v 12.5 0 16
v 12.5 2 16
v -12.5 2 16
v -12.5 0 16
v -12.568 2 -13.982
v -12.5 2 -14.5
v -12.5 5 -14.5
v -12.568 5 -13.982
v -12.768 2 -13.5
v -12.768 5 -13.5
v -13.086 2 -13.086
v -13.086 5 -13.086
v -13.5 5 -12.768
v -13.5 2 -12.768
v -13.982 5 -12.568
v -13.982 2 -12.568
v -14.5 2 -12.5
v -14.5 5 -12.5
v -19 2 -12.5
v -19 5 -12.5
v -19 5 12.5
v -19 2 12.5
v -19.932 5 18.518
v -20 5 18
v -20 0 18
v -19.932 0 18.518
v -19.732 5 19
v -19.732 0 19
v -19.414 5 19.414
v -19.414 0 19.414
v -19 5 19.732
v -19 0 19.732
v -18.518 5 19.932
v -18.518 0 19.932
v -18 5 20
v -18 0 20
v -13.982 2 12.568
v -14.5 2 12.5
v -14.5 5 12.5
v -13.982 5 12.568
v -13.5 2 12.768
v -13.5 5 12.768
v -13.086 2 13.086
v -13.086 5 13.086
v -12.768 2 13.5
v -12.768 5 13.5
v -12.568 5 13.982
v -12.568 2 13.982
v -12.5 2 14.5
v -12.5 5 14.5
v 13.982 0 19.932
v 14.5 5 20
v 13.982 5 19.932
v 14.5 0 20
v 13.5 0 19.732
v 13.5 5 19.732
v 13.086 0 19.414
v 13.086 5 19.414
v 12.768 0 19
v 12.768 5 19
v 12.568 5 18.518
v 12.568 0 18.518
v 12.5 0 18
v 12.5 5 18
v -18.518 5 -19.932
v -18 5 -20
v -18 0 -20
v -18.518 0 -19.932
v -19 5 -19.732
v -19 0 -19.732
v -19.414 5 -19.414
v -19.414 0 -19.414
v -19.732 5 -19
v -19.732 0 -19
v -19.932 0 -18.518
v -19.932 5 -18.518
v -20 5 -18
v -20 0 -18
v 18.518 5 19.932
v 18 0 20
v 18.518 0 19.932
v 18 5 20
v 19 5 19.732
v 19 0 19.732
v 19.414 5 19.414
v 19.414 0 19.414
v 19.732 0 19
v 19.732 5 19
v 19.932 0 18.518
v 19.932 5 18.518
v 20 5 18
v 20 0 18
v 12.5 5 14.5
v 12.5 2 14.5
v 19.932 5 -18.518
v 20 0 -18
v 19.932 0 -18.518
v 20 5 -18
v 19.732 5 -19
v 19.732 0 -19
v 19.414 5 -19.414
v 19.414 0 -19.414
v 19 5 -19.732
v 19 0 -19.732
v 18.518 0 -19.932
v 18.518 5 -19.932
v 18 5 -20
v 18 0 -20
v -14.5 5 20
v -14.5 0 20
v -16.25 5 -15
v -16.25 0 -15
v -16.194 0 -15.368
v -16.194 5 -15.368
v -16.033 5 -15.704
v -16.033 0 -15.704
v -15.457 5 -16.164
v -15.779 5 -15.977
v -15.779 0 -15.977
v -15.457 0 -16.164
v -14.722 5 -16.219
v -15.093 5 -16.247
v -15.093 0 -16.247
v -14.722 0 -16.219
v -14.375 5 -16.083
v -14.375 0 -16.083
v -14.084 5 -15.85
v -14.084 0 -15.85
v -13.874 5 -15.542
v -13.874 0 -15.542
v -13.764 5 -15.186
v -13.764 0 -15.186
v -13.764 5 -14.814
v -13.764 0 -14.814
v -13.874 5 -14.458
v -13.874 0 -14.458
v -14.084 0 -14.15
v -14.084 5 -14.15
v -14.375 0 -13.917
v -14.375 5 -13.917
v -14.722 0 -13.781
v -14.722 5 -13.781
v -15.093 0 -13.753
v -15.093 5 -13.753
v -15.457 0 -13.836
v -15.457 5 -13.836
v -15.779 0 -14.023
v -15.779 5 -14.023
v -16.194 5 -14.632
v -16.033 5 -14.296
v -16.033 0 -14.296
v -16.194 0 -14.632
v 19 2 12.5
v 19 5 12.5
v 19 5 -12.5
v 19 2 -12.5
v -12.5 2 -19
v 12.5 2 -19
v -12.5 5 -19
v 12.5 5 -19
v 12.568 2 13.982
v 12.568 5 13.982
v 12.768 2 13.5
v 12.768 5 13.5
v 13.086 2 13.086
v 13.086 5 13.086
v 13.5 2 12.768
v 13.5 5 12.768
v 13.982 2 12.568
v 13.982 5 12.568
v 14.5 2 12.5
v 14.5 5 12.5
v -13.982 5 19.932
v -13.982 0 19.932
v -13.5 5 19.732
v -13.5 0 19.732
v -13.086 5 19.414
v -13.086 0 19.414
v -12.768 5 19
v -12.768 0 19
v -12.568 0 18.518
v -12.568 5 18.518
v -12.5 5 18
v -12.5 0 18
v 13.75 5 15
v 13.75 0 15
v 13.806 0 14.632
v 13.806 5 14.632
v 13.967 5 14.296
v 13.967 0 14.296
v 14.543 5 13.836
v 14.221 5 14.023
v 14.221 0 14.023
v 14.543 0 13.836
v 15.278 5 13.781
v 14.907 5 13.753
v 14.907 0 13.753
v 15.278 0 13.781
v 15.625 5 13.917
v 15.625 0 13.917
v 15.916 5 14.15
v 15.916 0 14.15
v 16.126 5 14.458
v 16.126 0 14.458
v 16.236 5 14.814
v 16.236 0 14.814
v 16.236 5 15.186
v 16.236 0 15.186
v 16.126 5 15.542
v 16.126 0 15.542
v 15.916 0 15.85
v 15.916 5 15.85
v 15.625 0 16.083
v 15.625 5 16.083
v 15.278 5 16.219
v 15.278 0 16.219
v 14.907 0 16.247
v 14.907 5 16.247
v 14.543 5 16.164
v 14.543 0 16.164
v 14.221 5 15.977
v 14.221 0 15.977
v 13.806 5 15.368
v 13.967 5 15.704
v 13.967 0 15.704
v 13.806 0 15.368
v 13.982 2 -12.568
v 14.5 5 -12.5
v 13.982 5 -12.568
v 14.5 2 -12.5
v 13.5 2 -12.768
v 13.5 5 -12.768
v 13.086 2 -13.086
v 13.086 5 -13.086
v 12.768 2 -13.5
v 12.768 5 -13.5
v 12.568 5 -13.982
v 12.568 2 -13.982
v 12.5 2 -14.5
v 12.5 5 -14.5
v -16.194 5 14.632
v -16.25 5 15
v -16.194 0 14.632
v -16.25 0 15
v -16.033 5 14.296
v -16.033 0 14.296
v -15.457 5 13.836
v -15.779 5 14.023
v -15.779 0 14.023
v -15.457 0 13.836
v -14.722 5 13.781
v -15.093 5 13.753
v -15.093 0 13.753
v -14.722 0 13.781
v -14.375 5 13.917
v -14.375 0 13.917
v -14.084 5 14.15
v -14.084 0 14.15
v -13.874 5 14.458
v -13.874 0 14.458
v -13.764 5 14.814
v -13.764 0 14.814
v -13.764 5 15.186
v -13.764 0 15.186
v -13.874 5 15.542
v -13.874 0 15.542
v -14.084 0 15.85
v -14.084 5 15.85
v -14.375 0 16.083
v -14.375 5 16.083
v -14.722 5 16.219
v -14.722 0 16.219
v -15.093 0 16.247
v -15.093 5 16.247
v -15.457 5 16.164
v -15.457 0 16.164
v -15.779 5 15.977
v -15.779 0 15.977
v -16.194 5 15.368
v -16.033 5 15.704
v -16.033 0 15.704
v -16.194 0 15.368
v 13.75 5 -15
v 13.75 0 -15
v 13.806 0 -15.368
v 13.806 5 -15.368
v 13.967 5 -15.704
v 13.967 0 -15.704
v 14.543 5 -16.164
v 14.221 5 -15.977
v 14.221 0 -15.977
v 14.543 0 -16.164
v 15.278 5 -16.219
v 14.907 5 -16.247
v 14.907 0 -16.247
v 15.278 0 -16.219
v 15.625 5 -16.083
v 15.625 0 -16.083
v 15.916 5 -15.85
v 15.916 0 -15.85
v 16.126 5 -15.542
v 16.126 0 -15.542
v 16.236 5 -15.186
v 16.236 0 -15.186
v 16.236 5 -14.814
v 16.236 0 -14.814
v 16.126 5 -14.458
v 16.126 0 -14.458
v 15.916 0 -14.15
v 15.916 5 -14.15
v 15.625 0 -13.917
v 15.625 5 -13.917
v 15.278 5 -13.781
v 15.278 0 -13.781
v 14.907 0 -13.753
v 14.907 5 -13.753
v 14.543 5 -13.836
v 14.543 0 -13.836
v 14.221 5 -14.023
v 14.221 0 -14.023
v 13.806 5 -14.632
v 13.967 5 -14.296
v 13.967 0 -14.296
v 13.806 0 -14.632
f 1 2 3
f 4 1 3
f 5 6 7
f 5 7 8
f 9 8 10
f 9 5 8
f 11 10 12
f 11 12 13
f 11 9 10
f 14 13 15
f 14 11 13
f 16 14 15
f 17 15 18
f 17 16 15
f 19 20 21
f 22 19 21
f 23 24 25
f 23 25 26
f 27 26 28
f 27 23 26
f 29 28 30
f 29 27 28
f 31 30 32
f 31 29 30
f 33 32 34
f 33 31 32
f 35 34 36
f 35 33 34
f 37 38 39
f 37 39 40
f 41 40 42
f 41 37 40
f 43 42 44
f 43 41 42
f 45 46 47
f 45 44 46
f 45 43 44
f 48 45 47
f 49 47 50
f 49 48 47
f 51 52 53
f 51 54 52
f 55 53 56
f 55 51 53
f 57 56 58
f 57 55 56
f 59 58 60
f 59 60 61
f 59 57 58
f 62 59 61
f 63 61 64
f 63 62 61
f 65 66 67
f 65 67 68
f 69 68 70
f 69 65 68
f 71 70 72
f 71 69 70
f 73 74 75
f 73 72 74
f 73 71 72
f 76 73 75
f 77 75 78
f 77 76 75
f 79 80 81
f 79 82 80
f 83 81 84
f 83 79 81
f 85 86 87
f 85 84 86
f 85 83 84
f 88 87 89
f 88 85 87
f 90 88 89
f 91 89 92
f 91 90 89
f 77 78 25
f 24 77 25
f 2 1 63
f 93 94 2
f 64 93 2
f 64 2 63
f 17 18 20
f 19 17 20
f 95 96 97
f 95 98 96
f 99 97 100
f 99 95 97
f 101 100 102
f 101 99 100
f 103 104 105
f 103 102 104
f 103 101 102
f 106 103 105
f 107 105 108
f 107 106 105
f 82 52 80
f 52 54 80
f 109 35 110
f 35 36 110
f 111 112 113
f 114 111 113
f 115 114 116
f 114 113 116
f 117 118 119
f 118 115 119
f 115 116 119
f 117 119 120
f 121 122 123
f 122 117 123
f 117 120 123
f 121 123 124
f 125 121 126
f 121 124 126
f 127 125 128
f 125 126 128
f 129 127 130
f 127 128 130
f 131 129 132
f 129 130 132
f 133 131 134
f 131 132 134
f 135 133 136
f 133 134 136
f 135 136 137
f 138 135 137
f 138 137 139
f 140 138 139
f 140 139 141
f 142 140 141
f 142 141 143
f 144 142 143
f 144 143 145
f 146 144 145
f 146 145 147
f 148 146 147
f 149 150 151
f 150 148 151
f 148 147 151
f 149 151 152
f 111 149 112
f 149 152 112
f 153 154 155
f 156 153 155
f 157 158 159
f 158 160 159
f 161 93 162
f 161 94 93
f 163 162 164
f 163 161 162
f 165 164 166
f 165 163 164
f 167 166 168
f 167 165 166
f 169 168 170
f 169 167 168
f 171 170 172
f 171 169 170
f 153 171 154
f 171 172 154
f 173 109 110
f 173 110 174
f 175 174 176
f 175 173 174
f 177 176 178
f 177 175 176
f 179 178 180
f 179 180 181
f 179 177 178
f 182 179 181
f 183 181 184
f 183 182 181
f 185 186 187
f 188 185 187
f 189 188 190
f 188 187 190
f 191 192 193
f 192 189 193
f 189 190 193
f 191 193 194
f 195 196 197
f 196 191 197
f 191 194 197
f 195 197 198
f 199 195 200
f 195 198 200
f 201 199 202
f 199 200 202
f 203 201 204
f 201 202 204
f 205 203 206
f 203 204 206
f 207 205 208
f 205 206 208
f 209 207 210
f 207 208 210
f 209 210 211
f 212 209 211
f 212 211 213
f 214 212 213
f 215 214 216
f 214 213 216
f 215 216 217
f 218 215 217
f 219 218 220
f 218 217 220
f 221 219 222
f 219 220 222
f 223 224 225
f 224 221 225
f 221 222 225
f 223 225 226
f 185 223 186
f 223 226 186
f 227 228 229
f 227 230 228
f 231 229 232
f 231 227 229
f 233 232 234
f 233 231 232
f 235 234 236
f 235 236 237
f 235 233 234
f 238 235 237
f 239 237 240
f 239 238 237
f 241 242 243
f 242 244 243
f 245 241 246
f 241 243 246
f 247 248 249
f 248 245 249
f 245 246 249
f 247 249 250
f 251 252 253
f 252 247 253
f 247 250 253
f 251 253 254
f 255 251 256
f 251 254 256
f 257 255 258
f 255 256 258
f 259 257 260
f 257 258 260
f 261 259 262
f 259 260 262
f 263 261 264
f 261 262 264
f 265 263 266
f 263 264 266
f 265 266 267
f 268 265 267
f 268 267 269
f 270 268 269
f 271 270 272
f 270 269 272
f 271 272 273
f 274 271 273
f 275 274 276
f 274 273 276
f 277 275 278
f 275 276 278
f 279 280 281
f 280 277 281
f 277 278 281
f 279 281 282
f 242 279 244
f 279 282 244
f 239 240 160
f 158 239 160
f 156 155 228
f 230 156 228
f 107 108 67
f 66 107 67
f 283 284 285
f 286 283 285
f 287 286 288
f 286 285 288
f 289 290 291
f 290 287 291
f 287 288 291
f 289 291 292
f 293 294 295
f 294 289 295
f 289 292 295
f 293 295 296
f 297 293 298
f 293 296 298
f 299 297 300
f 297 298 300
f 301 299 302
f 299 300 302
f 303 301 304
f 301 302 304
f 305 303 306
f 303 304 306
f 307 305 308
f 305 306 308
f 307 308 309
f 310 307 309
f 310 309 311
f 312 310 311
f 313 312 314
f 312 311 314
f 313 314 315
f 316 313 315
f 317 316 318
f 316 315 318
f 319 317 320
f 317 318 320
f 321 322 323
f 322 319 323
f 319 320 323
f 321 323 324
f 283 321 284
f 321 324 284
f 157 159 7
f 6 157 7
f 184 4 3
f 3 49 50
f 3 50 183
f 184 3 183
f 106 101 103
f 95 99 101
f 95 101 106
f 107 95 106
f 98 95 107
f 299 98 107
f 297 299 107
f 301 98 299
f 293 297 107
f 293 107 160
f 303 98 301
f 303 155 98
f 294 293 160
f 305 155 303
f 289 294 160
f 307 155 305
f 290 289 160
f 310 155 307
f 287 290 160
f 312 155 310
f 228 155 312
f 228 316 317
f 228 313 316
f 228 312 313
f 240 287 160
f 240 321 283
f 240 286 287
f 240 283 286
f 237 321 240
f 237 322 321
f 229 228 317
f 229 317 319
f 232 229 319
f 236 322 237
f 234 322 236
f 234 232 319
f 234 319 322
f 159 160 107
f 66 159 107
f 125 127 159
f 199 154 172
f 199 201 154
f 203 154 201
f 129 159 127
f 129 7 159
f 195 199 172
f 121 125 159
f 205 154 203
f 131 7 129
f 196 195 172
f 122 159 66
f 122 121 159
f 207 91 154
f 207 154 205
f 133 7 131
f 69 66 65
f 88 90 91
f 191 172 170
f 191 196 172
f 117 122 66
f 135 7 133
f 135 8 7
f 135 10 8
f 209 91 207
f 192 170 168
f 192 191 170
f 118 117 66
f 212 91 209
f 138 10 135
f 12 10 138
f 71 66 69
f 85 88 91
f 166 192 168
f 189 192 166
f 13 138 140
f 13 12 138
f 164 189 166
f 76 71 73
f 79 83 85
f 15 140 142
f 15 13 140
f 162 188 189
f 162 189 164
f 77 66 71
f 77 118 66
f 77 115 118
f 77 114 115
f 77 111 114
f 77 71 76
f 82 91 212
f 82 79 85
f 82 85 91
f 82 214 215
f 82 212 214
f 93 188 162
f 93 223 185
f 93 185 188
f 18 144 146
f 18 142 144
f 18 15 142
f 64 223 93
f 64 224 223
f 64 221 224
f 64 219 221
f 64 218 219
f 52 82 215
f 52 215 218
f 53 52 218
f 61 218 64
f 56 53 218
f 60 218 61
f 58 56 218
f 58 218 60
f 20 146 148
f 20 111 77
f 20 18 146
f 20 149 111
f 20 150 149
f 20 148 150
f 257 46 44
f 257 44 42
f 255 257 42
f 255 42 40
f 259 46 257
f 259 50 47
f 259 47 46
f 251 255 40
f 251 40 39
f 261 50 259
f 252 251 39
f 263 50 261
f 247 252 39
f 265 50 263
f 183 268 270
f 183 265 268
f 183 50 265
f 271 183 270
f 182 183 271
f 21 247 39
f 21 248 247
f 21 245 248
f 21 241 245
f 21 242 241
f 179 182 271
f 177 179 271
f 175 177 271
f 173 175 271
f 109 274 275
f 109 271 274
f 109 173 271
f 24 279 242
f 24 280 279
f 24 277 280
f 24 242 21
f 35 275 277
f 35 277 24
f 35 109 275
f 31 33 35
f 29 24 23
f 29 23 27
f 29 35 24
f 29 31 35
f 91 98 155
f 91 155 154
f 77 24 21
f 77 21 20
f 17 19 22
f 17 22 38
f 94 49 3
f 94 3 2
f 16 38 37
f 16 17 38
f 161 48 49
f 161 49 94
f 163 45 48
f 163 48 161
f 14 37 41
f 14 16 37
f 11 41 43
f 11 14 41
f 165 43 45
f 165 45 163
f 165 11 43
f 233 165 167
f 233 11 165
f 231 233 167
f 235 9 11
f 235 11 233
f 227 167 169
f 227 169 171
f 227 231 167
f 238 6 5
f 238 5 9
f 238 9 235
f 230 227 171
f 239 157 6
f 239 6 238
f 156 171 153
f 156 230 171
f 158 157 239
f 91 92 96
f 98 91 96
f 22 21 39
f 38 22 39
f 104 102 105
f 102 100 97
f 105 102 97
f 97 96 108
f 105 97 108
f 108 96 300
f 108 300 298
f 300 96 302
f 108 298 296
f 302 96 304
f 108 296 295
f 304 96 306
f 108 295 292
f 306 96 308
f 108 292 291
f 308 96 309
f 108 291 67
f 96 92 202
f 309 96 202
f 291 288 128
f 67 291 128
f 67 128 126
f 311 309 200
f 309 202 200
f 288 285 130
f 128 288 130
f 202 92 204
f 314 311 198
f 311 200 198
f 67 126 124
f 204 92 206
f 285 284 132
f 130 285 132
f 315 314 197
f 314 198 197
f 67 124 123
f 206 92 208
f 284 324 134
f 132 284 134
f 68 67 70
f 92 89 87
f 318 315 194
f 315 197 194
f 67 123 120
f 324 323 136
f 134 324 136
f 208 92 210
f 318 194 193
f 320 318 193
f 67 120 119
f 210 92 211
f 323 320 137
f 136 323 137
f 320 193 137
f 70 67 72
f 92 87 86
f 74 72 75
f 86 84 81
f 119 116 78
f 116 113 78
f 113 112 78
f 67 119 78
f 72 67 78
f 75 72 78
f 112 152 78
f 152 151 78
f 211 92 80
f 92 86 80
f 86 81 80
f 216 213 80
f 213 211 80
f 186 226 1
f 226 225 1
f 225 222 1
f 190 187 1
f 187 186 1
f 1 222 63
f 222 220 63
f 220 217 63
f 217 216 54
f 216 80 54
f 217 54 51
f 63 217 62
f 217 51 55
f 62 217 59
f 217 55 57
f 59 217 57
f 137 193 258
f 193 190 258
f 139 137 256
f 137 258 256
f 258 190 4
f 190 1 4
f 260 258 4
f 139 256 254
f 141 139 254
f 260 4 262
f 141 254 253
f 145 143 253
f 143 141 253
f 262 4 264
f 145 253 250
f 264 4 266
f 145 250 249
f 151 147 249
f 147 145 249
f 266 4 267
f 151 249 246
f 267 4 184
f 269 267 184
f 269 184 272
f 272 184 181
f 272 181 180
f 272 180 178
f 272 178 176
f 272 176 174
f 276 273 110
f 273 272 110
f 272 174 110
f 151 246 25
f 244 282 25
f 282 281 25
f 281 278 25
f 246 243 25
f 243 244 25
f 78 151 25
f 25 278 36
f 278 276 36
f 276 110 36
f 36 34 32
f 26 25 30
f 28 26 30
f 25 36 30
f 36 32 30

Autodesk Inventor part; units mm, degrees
ref_plane "YZ Plane" through (0, 0, 0) normal (1, 0, 0) x (0, 1, 0)
ref_plane "XZ Plane" through (0, 0, 0) normal (0, 1, 0) x (-1, 0, 0)
ref_plane "XY Plane" through (0, 0, 0) normal (0, 0, 1) x (1, 0, 0)
sketch "Sketch1" plane through (0, 0, 0) normal (0, 1, 0) x (-1, 0, 0)
  line L0 (19, 19) -> (-19, 19) construction
  line L1 (-19, 19) -> (-19, -19) construction
  line L2 (-19, -19) -> (19, -19) construction
  line L3 (19, -19) -> (19, 19) construction
  line L4 (19, 19) -> (-19, -19) construction
  line L5 (-19, 19) -> (19, -19) construction
  circle A0 centre (15, -15) radius 1.25
  circle A1 centre (-15, -15) radius 1.25
  circle A2 centre (15, 15) radius 1.25
  circle A3 centre (-15, 15) radius 1.25
  line L6 (20, 20) -> (-20, 20)
  line L7 (-20, 20) -> (-20, -20)
  line L8 (-20, -20) -> (20, -20)
  line L9 (20, -20) -> (20, 20)
  line L10 (20, 20) -> (-20, -20) construction
  line L11 (-20, 20) -> (20, -20) construction
  point P0 (0, 0)
  dimension "d0" = 38
  dimension "d1" = 38
  dimension "d2" = 2.5
  dimension "d3" = 2.5
  dimension "d4" = 2.5
  dimension "d5" = 2.5
  dimension "d6" = 4
  dimension "d7" = 4
  dimension "d8" = 4
  dimension "d9" = 4
  dimension "d10" = 40
  dimension "d11" = 40
extrude "Extrusion1" add sketch "Sketch1" along normal blind 5
sketch "Sketch2" plane through (0, 5, 0) normal (0, 1, 0) x (1, 0, 0)
  line L0 (-12.5, 19) -> (-12.5, 12.5)
  line L1 (-12.5, 12.5) -> (-19, 12.5)
  line L2 (-19, 12.5) -> (-19, -12.5)
  line L3 (-20, 20) -> (-20, -20) projected
  line L4 (-19, -12.5) -> (-12.5, -12.5)
  line L5 (-12.5, -12.5) -> (-12.5, -20)
  line L6 (-12.5, -20) -> (12.5, -20)
  line L7 (12.5, -20) -> (12.5, -12.5)
  line L8 (12.5, -12.5) -> (19, -12.5)
  line L9 (19, -12.5) -> (19, 12.5)
  line L10 (19, 12.5) -> (12.5, 12.5)
  line L11 (12.5, 12.5) -> (12.5, 19)
  line L12 (12.5, 19) -> (-12.5, 19)
  point P0 (0, 0)
  dimension "d14" = 25
  dimension "d15" = 6.5
  dimension "d16" = 25
  dimension "d17" = 7.5
  dimension "d18" = 6.5
  dimension "d19" = 6.5
  dimension "d20" = 25
  dimension "d21" = 6.5
  dimension "d22" = 12.5
  dimension "d24" = 12.5
extrude "Extrusion2" cut sketch "Sketch2" against normal blind 3
sketch "Sketch3" plane through (0, 2, 0) normal (0, 1, 0) x (1, 0, 0)
  line L0 (12.5, -12.5) -> (12.5, -20) projected
  line L1 (-12.5, -20) -> (12.5, -20)
  line L2 (12.5, -20) -> (12.5, -16)
  line L3 (12.5, -16) -> (-12.5, -16)
  line L4 (-12.5, -16) -> (-12.5, -20)
  point P0 (0, 0)
  dimension "d27" = 4
extrude "Extrusion3" cut sketch "Sketch3" against normal through all
fillet "Fillet1" radius 2 10 edges at (-20, 2.5, -20) (20, 2.5, -20) (-20, 2.5, 20) (20, 2.5, 20) (-12.5, 3.5, -12.5) (12.5, 3.5, -12.5) (12.5, 3.5, 12.5) (-12.5, 3.5, 12.5) (-12.5, 2.5, 20) (12.5, 2.5, 20)
properties part number "CameraMount2"
